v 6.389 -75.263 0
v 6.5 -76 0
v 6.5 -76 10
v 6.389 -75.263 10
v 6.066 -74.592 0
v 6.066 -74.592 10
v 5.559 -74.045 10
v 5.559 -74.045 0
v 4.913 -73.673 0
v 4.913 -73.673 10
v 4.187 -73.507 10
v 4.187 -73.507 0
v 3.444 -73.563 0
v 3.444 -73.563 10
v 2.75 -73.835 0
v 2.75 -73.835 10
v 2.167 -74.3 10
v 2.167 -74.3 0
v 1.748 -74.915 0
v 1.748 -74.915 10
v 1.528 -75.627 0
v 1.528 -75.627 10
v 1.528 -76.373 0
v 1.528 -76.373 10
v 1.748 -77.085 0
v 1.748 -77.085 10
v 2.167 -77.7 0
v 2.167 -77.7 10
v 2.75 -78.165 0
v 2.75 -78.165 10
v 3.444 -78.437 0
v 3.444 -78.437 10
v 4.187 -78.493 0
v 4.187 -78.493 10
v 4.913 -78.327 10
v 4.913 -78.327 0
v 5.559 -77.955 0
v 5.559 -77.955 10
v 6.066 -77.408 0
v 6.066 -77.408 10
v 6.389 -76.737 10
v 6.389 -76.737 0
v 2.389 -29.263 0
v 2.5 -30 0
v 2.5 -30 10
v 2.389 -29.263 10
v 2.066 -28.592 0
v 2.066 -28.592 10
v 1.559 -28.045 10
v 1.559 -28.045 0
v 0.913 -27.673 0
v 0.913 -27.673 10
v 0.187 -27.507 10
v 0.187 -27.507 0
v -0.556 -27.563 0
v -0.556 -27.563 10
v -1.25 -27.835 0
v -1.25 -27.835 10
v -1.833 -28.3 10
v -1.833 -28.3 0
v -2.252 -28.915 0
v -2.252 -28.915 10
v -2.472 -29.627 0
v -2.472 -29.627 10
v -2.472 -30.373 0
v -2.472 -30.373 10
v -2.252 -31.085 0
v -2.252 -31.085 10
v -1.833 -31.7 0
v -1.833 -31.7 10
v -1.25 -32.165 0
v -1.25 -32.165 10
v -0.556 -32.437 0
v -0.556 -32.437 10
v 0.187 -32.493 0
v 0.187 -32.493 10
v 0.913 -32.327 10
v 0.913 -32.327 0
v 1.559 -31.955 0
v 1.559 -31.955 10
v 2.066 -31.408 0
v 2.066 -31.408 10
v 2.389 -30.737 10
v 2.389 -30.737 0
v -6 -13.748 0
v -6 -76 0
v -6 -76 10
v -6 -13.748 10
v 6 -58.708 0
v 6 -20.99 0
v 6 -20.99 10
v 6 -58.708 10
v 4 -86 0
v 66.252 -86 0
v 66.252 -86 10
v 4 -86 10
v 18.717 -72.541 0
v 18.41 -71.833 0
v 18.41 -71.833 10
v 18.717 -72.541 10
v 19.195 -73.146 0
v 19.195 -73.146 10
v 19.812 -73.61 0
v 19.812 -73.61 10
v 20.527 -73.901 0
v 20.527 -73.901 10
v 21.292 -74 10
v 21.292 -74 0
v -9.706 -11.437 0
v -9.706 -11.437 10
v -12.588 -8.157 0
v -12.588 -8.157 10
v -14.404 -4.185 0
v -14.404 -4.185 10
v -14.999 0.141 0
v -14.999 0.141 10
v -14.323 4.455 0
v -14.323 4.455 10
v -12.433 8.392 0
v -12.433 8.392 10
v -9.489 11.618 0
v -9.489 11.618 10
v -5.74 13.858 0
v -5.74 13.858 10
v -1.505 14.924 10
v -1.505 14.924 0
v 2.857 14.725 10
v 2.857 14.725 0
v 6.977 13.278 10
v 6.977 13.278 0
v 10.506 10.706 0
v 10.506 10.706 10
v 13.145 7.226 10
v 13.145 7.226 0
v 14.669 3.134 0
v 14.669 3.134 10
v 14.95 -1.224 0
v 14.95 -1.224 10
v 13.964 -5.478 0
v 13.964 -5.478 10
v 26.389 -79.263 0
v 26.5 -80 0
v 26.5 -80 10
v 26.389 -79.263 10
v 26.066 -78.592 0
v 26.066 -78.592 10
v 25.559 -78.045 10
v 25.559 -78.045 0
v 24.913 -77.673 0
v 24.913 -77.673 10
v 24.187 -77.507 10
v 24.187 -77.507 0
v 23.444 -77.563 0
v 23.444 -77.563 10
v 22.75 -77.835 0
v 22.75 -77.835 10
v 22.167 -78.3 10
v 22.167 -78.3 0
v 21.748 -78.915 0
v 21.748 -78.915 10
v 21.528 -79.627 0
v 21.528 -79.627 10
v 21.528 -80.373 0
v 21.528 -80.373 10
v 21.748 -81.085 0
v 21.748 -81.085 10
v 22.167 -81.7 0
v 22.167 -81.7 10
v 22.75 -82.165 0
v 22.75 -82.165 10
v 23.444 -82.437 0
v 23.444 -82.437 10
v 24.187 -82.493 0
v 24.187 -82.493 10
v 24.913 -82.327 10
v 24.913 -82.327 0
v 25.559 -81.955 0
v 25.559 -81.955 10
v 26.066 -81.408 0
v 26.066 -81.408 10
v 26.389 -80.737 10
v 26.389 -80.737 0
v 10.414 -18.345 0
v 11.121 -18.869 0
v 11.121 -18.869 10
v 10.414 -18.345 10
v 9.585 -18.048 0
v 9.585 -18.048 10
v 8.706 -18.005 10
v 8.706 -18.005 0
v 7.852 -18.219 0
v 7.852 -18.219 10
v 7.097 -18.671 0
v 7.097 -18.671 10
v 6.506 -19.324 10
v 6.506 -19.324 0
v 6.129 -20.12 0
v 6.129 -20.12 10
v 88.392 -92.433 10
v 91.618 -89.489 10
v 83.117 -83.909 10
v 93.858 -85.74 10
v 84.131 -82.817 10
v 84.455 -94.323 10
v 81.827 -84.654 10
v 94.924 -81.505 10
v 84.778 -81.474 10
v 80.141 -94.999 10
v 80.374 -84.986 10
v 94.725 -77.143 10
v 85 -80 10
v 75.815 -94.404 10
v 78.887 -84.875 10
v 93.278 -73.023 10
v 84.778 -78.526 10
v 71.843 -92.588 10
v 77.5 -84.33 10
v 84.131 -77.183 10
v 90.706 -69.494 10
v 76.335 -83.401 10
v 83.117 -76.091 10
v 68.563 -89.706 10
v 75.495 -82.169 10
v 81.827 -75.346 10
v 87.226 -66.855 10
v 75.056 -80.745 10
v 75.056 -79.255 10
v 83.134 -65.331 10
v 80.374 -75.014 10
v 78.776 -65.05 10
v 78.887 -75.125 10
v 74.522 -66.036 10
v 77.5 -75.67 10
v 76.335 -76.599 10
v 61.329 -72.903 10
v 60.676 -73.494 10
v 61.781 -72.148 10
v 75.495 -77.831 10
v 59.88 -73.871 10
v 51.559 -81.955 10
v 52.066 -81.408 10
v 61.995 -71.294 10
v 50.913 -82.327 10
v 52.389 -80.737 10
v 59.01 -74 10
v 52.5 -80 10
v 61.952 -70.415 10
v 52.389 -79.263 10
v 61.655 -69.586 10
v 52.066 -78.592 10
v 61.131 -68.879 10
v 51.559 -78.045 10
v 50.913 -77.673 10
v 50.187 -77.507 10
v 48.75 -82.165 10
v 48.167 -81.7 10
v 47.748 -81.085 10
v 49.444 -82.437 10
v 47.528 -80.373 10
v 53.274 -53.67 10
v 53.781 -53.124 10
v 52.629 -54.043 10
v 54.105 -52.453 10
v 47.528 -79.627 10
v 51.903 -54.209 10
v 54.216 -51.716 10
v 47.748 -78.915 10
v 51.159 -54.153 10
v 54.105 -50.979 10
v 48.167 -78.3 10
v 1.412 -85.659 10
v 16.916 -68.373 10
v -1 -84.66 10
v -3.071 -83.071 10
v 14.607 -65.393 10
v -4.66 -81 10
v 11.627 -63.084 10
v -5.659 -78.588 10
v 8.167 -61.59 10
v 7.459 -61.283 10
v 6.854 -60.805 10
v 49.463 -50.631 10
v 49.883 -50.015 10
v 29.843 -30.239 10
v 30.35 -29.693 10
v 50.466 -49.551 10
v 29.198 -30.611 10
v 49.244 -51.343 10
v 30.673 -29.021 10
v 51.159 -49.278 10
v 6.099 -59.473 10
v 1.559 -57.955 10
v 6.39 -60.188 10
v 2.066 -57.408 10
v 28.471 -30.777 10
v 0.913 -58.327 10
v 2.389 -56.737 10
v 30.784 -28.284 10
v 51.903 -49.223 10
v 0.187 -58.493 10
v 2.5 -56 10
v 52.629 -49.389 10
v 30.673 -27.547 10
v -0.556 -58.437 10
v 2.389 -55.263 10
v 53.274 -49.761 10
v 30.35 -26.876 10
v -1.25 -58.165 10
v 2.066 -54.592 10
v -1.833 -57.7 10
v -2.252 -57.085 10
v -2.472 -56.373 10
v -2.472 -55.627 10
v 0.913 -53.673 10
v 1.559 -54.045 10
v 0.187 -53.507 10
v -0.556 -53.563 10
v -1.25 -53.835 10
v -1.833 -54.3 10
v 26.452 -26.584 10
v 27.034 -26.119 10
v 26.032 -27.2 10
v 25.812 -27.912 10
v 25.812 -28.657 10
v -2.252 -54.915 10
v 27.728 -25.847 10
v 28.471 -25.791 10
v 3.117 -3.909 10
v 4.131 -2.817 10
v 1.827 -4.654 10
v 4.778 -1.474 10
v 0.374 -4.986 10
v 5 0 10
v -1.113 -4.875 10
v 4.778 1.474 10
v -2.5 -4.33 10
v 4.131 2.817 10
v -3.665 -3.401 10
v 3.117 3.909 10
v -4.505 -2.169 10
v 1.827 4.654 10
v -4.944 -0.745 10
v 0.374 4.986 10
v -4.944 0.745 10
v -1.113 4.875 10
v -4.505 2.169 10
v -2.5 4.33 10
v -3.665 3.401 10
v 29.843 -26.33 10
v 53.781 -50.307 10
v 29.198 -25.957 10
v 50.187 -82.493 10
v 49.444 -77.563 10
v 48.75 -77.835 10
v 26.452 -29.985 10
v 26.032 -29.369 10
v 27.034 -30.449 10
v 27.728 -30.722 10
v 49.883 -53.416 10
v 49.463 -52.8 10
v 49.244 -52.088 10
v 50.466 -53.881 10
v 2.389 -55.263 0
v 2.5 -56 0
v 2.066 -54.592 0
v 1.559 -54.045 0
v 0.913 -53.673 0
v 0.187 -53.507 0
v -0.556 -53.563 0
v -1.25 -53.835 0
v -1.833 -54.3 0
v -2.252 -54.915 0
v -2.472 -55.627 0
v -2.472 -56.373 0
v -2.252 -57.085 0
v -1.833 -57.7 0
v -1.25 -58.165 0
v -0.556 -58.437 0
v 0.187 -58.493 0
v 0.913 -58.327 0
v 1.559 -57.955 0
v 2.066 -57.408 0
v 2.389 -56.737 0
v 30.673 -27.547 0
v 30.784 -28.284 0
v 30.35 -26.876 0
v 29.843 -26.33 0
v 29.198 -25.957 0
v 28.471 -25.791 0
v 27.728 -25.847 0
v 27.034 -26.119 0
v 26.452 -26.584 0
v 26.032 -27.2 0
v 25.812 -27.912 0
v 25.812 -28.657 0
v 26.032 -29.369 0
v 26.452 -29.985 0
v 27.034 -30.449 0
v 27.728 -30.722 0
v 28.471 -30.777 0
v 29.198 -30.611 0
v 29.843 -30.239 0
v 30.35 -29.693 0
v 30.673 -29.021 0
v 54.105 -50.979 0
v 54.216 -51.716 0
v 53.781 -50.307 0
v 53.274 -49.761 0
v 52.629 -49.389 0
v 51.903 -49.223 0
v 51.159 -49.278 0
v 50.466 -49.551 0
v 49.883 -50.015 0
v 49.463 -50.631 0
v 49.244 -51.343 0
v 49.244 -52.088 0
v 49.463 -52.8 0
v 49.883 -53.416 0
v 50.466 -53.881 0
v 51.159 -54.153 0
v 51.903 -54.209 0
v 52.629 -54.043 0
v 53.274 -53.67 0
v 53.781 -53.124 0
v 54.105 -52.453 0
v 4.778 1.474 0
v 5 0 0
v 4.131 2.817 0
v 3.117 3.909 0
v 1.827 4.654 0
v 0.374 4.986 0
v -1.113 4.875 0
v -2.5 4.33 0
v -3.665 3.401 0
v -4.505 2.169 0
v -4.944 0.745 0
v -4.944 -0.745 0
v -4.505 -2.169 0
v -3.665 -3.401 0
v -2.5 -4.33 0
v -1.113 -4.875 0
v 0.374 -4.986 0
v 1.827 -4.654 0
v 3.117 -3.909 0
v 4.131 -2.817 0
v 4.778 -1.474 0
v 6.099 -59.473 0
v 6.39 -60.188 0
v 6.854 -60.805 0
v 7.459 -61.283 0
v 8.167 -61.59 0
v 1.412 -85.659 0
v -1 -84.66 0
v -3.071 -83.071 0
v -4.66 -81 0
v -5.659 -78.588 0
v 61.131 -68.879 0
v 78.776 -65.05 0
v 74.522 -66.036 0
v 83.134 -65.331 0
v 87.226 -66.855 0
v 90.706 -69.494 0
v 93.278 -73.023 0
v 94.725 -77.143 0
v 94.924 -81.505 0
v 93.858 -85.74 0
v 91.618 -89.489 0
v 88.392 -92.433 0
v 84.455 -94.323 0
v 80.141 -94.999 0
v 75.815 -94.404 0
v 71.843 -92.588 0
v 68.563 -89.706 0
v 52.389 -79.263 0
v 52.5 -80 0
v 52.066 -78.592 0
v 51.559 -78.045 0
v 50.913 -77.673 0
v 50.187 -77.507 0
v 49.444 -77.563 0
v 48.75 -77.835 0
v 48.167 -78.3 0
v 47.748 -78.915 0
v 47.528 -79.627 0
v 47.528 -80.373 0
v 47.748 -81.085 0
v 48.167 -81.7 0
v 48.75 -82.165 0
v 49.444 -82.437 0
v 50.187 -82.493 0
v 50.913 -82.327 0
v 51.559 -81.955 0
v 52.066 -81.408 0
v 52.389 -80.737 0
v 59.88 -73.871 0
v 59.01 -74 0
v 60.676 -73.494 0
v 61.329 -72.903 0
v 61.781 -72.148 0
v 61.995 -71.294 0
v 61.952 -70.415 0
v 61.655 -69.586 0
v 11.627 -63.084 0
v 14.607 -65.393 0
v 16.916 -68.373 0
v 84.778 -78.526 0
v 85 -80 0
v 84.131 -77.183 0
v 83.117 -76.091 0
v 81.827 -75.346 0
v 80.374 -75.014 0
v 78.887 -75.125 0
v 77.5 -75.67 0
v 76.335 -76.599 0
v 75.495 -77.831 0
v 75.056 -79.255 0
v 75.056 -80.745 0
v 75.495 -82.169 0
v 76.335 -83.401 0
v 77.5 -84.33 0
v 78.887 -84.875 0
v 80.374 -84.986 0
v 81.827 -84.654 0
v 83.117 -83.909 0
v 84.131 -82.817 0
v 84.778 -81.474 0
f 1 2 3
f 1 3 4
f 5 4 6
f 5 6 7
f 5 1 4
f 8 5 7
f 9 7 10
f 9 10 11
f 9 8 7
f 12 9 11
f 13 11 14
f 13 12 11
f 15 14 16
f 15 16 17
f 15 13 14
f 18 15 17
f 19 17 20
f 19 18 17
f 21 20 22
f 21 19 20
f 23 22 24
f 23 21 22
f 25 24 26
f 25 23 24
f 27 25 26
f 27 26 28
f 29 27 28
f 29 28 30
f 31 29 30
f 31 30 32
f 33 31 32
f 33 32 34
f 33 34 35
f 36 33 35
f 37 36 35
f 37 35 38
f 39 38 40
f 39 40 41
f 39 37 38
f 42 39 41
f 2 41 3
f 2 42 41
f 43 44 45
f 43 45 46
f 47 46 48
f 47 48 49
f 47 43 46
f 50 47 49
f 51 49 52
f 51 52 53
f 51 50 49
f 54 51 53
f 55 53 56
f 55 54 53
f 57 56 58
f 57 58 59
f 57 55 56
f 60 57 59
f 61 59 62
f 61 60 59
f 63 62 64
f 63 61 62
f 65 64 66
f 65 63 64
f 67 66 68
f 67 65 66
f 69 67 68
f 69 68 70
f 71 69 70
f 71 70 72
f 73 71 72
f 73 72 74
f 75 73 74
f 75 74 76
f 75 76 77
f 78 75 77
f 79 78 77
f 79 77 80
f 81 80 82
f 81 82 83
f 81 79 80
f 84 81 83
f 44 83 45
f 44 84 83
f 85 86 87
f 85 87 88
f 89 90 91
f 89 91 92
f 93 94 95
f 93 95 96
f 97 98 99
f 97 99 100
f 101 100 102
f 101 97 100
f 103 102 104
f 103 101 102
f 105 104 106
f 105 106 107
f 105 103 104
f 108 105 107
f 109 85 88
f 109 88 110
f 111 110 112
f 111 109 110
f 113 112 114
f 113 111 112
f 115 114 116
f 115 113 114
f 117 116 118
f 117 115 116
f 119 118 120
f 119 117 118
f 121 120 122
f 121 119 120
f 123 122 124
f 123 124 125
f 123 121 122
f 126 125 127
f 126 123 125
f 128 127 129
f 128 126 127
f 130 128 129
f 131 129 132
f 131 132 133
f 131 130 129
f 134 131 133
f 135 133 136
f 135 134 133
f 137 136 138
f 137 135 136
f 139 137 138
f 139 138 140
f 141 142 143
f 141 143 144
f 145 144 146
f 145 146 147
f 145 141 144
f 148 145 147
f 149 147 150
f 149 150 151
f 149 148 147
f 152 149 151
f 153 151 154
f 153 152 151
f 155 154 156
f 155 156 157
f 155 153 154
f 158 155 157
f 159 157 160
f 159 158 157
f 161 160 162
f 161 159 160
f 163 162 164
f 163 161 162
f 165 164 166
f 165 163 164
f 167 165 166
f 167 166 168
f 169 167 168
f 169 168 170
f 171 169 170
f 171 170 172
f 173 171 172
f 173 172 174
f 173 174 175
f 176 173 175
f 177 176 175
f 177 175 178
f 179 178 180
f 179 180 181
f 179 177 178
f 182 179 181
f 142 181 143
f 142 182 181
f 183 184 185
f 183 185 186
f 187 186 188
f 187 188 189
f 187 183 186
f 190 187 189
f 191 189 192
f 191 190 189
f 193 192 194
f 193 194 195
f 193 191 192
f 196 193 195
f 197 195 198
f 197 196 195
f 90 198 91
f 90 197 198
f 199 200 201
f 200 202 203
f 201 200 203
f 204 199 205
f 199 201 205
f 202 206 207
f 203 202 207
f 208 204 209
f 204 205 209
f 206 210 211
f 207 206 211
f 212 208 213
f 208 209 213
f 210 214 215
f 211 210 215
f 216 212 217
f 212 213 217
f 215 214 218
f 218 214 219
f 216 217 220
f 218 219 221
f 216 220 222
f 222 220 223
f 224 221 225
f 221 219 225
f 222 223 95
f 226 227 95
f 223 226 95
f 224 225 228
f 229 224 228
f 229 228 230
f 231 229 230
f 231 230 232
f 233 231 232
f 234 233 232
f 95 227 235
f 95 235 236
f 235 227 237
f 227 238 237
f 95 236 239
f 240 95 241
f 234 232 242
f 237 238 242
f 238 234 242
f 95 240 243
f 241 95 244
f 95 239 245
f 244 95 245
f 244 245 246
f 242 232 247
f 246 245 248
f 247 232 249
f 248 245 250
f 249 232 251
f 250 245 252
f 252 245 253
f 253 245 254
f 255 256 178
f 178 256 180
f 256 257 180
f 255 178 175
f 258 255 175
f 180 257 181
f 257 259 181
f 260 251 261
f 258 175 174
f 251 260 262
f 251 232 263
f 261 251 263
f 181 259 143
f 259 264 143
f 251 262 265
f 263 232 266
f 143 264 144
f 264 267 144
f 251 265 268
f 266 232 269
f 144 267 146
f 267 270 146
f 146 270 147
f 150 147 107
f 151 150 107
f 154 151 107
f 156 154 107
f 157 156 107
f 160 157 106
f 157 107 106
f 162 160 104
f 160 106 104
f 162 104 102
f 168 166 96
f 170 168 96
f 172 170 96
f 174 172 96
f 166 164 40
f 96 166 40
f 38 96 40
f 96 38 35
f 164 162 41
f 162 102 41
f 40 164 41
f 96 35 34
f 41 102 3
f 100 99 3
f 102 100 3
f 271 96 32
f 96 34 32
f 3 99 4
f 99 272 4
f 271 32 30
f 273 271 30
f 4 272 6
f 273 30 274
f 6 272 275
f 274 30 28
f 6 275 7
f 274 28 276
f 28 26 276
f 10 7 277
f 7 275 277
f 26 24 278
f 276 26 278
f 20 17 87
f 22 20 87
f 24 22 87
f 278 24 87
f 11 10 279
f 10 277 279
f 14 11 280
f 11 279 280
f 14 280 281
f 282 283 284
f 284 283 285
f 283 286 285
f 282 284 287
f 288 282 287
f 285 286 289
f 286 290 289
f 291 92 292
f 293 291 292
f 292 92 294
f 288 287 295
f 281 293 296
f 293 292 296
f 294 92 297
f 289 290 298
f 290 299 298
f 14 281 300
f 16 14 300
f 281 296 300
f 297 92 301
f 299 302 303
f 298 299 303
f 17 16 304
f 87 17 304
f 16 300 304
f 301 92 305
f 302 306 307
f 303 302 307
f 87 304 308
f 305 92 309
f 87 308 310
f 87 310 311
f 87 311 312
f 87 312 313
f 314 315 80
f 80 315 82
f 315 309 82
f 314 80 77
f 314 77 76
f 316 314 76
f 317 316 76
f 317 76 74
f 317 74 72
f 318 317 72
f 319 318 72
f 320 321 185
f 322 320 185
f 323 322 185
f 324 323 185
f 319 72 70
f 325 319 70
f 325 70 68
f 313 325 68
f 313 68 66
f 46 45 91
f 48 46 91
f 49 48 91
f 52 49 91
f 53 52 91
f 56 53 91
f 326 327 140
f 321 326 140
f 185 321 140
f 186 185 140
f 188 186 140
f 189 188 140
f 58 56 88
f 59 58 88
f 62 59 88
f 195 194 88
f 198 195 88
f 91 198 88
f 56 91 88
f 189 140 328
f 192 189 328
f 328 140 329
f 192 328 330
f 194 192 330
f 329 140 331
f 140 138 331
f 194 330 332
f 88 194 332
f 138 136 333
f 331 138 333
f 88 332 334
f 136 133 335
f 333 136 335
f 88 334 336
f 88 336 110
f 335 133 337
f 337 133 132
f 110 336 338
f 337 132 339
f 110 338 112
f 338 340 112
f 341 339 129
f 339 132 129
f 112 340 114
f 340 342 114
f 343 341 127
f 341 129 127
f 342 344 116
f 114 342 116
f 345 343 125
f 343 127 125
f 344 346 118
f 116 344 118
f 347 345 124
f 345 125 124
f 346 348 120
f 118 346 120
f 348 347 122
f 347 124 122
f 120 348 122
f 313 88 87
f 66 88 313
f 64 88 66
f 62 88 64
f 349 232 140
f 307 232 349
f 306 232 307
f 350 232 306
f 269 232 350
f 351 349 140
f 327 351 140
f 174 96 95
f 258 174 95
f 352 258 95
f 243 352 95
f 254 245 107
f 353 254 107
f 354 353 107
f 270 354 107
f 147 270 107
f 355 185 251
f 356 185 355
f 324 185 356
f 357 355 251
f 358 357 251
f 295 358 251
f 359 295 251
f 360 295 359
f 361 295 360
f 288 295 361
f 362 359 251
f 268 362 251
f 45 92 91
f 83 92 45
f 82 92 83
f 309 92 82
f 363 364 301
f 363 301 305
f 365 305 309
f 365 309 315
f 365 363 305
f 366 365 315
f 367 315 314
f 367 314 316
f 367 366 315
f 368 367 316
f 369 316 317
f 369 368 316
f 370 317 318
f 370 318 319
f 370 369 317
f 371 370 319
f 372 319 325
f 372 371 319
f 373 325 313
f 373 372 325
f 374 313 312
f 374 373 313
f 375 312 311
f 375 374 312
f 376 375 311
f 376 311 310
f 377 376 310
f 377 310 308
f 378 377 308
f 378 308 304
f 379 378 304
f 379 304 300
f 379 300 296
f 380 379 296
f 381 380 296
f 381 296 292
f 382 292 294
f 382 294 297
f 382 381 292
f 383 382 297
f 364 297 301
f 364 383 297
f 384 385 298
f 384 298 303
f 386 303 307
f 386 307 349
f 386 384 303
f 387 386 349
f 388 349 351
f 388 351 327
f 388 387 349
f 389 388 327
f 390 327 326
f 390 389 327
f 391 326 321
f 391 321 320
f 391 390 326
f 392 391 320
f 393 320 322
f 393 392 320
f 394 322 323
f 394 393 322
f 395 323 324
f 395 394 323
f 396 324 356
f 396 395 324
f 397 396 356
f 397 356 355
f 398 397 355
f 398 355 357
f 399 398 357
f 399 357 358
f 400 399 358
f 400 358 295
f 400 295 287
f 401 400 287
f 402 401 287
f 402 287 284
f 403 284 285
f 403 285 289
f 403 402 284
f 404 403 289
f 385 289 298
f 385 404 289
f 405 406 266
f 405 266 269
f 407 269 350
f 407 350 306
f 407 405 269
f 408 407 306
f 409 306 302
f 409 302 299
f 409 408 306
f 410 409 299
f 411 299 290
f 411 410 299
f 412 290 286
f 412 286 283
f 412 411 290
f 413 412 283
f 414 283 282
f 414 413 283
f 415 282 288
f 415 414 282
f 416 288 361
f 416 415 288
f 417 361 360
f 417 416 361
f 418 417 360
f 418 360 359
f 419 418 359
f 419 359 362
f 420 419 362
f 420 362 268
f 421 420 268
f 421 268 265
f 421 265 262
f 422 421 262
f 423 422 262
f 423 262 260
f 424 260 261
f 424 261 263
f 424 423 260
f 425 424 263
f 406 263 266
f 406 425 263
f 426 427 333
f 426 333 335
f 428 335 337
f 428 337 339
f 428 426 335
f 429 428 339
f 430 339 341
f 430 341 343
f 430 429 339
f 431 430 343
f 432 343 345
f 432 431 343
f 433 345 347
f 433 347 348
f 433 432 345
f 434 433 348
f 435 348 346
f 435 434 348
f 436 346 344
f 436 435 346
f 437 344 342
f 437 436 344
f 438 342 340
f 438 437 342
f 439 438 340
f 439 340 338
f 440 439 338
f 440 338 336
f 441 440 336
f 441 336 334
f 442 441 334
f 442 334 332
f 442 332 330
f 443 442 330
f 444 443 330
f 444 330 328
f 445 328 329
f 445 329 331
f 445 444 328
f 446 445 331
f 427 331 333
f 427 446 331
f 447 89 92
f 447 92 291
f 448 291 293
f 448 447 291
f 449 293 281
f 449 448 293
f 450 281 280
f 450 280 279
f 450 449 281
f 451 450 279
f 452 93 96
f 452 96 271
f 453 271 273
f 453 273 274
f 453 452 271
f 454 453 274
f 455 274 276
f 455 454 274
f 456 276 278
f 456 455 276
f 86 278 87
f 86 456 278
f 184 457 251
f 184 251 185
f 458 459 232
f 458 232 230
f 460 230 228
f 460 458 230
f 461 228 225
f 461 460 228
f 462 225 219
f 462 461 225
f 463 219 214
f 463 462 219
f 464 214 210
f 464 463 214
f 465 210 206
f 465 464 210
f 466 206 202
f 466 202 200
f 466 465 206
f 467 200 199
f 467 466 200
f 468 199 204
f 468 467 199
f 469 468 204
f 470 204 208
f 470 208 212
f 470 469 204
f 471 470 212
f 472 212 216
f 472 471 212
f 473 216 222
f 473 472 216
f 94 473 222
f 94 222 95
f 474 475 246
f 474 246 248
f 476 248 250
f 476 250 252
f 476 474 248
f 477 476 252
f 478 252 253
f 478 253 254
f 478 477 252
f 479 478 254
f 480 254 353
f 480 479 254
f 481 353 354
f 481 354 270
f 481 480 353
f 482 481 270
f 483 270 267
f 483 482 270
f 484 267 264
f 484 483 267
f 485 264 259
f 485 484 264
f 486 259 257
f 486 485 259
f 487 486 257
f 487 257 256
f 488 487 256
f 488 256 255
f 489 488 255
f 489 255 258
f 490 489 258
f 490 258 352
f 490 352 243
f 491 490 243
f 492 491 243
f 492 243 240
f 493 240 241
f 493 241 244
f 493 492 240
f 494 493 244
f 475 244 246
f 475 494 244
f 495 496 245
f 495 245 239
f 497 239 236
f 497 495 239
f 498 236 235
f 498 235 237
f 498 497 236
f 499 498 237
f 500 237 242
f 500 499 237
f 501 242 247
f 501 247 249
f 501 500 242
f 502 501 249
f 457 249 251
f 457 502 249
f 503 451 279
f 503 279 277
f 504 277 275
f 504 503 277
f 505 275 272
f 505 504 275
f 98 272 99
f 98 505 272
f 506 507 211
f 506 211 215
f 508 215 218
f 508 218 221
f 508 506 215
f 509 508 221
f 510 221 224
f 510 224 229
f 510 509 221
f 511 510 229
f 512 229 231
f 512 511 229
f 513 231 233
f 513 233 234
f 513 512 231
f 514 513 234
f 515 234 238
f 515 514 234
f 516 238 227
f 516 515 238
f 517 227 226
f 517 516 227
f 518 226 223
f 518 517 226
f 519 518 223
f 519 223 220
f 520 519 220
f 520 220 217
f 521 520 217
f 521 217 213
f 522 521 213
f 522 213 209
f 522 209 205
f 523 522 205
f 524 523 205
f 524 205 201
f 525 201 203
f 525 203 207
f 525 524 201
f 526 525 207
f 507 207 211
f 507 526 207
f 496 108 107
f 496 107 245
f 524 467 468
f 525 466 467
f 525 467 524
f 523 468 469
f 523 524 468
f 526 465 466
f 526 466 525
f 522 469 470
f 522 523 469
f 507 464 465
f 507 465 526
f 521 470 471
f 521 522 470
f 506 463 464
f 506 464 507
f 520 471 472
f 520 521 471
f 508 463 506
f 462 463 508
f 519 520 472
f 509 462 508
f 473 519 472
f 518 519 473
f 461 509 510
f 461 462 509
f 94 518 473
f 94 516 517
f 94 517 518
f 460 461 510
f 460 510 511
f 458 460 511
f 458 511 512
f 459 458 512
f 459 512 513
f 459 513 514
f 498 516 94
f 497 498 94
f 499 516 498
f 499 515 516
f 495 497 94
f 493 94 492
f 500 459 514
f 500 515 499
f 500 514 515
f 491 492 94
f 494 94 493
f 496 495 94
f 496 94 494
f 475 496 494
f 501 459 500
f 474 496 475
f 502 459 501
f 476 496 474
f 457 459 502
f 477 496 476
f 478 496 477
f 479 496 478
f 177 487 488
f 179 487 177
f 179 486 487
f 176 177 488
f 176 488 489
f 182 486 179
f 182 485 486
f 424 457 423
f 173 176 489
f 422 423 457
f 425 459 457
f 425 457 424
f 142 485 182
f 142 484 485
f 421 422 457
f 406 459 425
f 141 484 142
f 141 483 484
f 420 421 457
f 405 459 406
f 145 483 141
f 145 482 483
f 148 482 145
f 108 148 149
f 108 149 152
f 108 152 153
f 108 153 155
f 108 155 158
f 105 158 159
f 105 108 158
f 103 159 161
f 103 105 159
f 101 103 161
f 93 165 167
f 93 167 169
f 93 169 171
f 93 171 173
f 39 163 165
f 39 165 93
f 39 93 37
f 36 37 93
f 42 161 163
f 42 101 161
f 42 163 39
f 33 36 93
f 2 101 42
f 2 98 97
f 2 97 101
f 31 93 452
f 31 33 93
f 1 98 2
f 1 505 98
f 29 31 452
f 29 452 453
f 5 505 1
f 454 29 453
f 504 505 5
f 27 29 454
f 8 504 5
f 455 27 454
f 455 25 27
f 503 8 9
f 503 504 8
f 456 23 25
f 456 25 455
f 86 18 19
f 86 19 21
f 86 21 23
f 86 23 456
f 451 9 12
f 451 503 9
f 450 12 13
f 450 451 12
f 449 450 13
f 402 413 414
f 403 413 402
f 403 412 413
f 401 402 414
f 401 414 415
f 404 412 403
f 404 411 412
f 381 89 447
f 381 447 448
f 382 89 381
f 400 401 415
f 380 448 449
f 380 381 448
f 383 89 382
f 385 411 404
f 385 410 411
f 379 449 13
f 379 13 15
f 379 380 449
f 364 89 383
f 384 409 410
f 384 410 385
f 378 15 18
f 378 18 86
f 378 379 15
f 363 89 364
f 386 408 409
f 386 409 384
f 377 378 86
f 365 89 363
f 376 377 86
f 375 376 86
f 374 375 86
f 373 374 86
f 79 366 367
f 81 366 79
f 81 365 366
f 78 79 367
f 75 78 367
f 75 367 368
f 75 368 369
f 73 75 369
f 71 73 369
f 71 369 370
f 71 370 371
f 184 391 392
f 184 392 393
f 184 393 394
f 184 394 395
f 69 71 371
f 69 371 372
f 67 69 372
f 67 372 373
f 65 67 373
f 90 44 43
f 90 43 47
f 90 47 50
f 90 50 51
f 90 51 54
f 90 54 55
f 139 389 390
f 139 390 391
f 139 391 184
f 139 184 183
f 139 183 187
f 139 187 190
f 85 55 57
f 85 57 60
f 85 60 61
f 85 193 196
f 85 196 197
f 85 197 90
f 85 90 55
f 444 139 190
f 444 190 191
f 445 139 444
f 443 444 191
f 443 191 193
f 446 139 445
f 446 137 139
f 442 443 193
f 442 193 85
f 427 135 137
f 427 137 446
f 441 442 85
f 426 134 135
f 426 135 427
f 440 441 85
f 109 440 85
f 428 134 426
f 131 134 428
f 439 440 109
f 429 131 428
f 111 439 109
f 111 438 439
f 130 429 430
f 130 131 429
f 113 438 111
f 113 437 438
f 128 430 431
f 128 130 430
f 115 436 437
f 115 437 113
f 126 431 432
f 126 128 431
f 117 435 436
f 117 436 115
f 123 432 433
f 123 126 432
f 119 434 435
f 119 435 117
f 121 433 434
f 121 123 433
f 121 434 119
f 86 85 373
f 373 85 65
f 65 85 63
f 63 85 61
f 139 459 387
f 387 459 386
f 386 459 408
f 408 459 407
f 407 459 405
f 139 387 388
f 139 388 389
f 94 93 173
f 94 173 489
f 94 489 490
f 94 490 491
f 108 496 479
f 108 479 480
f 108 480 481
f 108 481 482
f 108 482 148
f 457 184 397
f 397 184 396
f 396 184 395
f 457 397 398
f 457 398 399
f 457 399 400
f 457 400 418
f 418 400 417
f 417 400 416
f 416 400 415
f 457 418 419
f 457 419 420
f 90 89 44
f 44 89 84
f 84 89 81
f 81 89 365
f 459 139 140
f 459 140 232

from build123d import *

# Parameters (mm, degrees)
ESBO_O1_R                = 5
ESBO_O1_R_2              = 2.5
RESSALTO_EXTRUS_O1_DEPTH = 10


with BuildPart() as part:
    # Esboço1 → Ressalto-extrusão1 (new body)
    with BuildSketch(Plane.XY):
        with BuildLine():
            Line((-6, -76), (-6, -13.747727085))
            ThreePointArc((-6, -13.747727085), (-5.740251485, 13.858192988), (13.963751735, -5.47847036))
            Line((13.963751735, -5.47847036), (74.52152964, -66.036248265))
            ThreePointArc((74.52152964, -66.036248265), (93.858192988, -85.740251485), (66.252272915, -86))
            Line((66.252272915, -86), (4, -86))
            ThreePointArc((4, -86), (-3.071067812, -83.071067812), (-6, -76))
        make_face()
        Circle(ESBO_O1_R, mode=Mode.SUBTRACT)
        with Locations((0, -30)):
            Circle(ESBO_O1_R_2, mode=Mode.SUBTRACT)
        with Locations((0, -56)):
            Circle(ESBO_O1_R_2, mode=Mode.SUBTRACT)
        with Locations((4, -76)):
            Circle(ESBO_O1_R_2, mode=Mode.SUBTRACT)
        with Locations((24, -80)):
            Circle(ESBO_O1_R_2, mode=Mode.SUBTRACT)
        with Locations((50, -80)):
            Circle(ESBO_O1_R_2, mode=Mode.SUBTRACT)
        with Locations((80, -80)):
            Circle(ESBO_O1_R, mode=Mode.SUBTRACT)
        with Locations((28.284271247, -28.284271247)):
            Circle(ESBO_O1_R_2, mode=Mode.SUBTRACT)
        with Locations((51.715728753, -51.715728753)):
            Circle(ESBO_O1_R_2, mode=Mode.SUBTRACT)
        with BuildLine():
            Line((21.291616466, -74), (59.009632228, -74))
            ThreePointArc((59.009632228, -74), (61.781270826, -72.148050297), (61.130952572, -68.878679656))
            Line((61.130952572, -68.878679656), (11.121320344, -18.869047428))
            ThreePointArc((11.121320344, -18.869047428), (7.851949703, -18.218729174), (6, -20.990367772))
            Line((6, -20.990367772), (6, -58.708383534))
            ThreePointArc((6, -58.708383534), (6.602084238, -60.511159172), (8.166666667, -61.590319612))
            ThreePointArc((8.166666667, -61.590319612), (14.606601718, -65.393398282), (18.409680388, -71.833333333))
            ThreePointArc((18.409680388, -71.833333333), (19.488840828, -73.397915762), (21.291616466, -74))
        make_face(mode=Mode.SUBTRACT)
    extrude(amount=RESSALTO_EXTRUS_O1_DEPTH)


solid = part.part
